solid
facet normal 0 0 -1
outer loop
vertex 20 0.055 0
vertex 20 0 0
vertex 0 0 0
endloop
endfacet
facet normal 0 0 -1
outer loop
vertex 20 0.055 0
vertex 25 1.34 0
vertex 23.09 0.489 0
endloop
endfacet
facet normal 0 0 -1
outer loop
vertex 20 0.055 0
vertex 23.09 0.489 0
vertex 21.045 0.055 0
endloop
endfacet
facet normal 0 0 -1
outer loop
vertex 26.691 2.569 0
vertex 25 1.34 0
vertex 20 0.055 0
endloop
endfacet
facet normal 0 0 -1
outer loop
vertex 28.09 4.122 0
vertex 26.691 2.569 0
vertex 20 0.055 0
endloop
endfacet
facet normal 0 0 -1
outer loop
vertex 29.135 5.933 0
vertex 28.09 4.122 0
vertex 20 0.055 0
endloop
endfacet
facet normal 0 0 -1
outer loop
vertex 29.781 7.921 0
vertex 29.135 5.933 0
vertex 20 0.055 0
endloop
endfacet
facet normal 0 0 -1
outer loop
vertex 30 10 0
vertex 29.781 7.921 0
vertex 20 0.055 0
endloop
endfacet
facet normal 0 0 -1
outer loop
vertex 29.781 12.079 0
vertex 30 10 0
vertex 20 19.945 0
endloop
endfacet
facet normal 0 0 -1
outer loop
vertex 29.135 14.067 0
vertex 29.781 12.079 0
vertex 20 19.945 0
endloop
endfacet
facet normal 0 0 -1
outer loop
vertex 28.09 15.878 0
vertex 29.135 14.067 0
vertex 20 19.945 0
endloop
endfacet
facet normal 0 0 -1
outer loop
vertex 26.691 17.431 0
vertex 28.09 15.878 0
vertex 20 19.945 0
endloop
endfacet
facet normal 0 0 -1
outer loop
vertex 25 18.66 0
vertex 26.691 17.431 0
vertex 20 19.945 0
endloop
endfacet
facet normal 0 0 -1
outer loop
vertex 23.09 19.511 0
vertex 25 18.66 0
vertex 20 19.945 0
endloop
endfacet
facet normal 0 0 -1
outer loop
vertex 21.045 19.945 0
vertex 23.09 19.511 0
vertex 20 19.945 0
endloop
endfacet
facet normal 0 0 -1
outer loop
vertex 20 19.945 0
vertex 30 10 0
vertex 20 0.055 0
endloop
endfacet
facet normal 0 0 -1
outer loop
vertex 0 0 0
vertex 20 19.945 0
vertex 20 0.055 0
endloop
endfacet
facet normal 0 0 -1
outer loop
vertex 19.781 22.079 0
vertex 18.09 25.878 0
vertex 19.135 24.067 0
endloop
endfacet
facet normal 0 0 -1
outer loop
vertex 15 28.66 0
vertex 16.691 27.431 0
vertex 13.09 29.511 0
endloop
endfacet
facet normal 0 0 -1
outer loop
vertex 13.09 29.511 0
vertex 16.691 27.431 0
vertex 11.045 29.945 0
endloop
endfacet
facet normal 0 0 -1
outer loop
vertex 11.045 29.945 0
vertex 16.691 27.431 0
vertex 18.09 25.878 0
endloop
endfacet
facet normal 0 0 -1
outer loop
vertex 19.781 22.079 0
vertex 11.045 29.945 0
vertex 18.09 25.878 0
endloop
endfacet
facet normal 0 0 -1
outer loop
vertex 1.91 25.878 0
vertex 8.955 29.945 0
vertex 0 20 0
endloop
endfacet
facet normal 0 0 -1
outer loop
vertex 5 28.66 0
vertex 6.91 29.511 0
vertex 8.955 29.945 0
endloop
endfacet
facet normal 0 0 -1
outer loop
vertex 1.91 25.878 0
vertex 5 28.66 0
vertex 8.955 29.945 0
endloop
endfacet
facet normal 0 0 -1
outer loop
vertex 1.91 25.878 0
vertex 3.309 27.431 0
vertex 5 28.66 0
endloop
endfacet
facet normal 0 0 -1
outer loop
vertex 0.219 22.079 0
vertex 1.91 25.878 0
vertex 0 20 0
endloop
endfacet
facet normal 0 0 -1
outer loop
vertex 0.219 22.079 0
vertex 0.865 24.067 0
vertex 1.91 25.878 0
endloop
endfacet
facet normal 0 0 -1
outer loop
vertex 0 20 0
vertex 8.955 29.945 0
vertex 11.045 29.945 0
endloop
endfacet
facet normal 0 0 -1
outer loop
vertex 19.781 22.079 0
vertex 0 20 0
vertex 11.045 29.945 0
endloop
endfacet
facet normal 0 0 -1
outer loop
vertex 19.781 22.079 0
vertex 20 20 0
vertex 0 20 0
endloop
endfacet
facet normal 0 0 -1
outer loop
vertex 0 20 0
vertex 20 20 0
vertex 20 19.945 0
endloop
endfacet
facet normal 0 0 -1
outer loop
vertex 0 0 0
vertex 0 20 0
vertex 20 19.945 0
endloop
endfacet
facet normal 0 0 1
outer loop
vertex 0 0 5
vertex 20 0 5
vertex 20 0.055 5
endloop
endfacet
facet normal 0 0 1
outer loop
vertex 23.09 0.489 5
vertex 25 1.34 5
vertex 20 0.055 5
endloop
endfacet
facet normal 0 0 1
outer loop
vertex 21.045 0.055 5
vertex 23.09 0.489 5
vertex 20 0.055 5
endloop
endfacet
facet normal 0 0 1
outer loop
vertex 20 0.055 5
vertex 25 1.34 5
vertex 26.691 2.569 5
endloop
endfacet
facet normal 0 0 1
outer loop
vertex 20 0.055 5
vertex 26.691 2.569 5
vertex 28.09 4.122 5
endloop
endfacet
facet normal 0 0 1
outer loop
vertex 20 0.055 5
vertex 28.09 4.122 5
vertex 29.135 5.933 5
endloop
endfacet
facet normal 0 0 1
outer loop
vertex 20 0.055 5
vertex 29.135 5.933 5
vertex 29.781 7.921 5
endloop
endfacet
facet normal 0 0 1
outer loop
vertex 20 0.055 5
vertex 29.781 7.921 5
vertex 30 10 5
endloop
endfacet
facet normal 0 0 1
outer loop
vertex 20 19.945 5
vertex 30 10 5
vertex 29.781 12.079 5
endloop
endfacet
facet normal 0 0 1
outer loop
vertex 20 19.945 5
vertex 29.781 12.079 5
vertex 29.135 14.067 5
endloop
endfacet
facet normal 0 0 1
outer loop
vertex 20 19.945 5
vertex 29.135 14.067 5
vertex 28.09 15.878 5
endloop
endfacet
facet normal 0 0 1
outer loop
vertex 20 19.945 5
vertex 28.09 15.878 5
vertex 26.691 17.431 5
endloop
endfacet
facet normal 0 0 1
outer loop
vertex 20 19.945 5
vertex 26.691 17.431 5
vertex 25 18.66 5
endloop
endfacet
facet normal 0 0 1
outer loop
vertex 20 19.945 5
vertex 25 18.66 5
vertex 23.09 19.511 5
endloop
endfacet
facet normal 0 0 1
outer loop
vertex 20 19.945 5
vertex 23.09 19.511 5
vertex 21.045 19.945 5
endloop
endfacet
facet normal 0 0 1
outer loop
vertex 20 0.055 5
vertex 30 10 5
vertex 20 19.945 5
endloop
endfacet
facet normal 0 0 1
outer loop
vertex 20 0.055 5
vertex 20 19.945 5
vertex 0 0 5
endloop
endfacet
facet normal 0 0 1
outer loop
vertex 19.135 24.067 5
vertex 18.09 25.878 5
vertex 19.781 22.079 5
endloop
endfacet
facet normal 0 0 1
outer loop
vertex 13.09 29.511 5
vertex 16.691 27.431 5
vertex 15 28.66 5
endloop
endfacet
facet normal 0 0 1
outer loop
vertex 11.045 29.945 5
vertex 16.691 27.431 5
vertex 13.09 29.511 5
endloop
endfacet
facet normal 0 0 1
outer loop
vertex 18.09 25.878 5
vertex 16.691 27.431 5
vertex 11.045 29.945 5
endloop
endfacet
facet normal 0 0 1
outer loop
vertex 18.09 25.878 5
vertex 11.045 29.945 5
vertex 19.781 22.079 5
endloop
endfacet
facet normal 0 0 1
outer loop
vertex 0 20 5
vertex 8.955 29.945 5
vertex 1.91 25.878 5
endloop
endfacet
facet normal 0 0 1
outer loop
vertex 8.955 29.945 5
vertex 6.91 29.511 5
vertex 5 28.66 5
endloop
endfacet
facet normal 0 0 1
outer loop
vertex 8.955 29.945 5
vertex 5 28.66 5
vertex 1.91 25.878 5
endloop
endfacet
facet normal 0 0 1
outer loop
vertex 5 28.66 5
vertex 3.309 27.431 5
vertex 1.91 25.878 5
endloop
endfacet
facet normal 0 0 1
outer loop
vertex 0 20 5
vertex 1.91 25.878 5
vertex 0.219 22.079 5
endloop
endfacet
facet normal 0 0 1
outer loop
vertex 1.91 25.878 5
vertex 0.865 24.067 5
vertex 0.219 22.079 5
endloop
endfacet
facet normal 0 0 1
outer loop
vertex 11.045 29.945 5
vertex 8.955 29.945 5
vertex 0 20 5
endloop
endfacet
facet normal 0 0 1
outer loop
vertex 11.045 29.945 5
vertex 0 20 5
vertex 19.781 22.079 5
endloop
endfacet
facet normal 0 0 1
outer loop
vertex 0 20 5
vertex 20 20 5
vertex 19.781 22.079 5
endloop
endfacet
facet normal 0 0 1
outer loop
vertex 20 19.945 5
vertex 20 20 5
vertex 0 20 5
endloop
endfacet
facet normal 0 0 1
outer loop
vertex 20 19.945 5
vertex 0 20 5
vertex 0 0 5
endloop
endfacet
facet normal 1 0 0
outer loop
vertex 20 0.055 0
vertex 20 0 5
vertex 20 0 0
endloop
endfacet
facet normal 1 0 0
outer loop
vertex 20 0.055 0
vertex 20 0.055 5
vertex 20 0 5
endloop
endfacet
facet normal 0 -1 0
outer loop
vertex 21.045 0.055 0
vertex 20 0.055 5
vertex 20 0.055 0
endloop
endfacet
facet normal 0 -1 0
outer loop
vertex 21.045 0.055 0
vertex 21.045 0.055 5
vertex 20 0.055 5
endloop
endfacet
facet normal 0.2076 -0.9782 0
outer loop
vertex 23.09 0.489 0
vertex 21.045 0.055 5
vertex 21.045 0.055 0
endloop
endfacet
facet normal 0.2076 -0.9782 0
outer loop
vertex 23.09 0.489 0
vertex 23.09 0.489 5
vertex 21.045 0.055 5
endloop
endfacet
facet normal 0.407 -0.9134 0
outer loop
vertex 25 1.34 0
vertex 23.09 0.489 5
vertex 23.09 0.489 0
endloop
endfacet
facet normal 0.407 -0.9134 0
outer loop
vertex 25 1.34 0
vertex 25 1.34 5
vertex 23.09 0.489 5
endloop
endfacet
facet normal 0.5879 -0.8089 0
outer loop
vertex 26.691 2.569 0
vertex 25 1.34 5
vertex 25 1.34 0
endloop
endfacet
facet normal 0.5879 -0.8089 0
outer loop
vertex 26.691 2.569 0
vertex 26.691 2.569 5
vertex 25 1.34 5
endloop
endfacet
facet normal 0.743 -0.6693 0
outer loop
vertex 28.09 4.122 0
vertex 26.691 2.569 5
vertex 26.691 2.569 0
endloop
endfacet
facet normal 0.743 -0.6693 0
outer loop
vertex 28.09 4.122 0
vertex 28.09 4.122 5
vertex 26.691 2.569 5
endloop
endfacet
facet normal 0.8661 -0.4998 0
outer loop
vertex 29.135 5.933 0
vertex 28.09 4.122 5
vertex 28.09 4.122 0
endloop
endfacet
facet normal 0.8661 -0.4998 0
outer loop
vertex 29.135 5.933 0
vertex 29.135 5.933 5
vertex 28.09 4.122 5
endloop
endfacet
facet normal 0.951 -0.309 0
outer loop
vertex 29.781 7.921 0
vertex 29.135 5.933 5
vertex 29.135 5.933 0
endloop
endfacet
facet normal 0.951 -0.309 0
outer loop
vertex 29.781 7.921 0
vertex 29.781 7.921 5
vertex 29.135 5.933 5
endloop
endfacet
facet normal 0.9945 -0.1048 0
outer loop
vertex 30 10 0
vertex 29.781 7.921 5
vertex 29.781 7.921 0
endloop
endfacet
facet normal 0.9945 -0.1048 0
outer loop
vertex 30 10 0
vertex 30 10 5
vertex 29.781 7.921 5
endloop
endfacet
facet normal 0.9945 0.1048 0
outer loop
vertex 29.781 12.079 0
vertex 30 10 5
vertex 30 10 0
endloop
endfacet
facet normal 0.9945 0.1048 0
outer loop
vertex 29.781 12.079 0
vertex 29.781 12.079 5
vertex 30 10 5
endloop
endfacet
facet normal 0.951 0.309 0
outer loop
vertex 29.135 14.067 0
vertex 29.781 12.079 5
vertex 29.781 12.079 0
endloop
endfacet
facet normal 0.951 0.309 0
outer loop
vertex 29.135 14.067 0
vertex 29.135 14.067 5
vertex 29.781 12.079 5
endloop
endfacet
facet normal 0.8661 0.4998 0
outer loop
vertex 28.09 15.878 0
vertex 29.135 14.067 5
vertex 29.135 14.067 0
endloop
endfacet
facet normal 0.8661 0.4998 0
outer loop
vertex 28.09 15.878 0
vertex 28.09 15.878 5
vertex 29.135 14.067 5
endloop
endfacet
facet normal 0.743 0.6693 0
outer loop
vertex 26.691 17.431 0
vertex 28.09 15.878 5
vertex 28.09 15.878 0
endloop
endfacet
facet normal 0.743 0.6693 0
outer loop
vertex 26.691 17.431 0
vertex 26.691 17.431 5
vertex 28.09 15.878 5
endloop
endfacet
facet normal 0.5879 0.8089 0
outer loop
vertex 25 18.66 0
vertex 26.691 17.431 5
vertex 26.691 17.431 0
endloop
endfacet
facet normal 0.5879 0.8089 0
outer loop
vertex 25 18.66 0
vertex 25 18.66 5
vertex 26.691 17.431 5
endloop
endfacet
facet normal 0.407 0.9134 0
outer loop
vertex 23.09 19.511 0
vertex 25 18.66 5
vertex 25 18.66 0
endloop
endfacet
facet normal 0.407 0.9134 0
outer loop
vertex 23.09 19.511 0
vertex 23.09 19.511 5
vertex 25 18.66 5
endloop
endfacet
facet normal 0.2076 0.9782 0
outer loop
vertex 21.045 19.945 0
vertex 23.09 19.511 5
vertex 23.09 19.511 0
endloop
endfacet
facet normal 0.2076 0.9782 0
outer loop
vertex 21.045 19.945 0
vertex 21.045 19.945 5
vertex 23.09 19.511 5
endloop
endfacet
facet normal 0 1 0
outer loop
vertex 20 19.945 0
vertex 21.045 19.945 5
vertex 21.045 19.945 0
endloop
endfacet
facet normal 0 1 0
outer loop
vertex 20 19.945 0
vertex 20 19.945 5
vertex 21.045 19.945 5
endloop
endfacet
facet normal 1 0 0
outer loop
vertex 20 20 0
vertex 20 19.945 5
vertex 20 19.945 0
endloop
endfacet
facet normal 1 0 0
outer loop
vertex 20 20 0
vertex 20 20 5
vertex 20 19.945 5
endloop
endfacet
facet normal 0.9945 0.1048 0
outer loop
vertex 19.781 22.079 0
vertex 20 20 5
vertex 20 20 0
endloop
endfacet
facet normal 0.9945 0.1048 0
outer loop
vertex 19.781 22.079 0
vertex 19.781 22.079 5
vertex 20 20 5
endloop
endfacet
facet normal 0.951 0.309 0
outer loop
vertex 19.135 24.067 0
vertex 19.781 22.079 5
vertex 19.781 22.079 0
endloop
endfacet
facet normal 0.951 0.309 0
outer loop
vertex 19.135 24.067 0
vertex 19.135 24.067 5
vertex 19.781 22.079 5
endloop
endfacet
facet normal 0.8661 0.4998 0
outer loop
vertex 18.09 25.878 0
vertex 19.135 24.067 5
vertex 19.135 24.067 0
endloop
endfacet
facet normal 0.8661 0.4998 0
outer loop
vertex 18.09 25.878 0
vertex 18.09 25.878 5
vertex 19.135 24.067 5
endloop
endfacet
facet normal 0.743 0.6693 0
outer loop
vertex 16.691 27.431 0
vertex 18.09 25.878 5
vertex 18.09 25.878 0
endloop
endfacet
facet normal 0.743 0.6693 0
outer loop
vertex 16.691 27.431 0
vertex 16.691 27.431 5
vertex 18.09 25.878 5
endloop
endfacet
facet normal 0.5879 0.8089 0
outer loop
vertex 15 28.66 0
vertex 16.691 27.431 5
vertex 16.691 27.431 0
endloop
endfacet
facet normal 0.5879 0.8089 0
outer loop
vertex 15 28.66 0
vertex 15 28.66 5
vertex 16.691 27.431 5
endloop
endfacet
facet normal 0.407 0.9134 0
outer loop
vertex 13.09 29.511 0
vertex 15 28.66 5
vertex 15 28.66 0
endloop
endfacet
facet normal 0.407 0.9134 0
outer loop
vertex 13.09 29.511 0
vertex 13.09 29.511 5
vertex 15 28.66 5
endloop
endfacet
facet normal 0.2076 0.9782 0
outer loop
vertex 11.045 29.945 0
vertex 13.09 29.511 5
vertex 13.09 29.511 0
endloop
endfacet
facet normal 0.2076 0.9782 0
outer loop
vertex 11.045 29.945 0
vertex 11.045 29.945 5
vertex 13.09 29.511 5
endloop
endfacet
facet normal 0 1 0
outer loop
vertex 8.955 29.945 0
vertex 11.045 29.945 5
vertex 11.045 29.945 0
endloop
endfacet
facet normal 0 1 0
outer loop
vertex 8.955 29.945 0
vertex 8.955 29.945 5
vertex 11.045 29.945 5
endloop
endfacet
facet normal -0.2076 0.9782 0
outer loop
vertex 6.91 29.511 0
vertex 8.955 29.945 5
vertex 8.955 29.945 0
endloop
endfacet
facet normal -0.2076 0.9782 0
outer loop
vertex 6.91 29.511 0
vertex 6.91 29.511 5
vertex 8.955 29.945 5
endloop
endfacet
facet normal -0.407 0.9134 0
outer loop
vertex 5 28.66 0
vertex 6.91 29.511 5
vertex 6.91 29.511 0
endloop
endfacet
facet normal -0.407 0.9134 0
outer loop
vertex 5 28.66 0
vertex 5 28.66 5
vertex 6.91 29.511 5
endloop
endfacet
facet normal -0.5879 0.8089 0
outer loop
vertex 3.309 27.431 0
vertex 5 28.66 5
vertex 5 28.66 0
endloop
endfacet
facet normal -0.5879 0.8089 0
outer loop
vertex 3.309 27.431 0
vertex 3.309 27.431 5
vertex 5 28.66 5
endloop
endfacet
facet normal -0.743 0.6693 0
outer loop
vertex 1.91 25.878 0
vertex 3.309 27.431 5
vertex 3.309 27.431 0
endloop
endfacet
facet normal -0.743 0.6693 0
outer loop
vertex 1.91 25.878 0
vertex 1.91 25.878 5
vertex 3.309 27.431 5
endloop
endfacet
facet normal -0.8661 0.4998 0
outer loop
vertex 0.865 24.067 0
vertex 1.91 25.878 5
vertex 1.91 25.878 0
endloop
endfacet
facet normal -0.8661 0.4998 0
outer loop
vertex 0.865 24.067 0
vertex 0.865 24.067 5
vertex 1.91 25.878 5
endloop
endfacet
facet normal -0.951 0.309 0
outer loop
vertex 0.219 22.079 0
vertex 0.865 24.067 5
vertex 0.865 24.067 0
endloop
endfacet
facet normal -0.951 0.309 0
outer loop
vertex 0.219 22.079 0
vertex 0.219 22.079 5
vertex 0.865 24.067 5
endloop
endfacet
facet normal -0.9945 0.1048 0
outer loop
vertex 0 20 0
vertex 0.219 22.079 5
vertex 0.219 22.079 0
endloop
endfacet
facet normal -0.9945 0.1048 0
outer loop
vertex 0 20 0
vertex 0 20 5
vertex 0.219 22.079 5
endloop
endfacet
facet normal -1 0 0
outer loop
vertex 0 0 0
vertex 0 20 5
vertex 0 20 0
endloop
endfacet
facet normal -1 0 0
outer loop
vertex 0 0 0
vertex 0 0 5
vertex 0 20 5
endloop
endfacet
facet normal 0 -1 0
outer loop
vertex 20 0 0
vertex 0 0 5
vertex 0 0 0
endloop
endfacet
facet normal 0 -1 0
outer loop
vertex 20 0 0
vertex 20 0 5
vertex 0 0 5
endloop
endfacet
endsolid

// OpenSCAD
module 2DHeart(size)
{
    square(size);
    translate([size/2,size,0]) circle(size/2);
    translate([size,size/2,0]) circle(size/2);
}

module 3DHeart(size, height)
{
    linear_extrude(height)
    2DHeart(size);
}

3DHeart(20, 5);
